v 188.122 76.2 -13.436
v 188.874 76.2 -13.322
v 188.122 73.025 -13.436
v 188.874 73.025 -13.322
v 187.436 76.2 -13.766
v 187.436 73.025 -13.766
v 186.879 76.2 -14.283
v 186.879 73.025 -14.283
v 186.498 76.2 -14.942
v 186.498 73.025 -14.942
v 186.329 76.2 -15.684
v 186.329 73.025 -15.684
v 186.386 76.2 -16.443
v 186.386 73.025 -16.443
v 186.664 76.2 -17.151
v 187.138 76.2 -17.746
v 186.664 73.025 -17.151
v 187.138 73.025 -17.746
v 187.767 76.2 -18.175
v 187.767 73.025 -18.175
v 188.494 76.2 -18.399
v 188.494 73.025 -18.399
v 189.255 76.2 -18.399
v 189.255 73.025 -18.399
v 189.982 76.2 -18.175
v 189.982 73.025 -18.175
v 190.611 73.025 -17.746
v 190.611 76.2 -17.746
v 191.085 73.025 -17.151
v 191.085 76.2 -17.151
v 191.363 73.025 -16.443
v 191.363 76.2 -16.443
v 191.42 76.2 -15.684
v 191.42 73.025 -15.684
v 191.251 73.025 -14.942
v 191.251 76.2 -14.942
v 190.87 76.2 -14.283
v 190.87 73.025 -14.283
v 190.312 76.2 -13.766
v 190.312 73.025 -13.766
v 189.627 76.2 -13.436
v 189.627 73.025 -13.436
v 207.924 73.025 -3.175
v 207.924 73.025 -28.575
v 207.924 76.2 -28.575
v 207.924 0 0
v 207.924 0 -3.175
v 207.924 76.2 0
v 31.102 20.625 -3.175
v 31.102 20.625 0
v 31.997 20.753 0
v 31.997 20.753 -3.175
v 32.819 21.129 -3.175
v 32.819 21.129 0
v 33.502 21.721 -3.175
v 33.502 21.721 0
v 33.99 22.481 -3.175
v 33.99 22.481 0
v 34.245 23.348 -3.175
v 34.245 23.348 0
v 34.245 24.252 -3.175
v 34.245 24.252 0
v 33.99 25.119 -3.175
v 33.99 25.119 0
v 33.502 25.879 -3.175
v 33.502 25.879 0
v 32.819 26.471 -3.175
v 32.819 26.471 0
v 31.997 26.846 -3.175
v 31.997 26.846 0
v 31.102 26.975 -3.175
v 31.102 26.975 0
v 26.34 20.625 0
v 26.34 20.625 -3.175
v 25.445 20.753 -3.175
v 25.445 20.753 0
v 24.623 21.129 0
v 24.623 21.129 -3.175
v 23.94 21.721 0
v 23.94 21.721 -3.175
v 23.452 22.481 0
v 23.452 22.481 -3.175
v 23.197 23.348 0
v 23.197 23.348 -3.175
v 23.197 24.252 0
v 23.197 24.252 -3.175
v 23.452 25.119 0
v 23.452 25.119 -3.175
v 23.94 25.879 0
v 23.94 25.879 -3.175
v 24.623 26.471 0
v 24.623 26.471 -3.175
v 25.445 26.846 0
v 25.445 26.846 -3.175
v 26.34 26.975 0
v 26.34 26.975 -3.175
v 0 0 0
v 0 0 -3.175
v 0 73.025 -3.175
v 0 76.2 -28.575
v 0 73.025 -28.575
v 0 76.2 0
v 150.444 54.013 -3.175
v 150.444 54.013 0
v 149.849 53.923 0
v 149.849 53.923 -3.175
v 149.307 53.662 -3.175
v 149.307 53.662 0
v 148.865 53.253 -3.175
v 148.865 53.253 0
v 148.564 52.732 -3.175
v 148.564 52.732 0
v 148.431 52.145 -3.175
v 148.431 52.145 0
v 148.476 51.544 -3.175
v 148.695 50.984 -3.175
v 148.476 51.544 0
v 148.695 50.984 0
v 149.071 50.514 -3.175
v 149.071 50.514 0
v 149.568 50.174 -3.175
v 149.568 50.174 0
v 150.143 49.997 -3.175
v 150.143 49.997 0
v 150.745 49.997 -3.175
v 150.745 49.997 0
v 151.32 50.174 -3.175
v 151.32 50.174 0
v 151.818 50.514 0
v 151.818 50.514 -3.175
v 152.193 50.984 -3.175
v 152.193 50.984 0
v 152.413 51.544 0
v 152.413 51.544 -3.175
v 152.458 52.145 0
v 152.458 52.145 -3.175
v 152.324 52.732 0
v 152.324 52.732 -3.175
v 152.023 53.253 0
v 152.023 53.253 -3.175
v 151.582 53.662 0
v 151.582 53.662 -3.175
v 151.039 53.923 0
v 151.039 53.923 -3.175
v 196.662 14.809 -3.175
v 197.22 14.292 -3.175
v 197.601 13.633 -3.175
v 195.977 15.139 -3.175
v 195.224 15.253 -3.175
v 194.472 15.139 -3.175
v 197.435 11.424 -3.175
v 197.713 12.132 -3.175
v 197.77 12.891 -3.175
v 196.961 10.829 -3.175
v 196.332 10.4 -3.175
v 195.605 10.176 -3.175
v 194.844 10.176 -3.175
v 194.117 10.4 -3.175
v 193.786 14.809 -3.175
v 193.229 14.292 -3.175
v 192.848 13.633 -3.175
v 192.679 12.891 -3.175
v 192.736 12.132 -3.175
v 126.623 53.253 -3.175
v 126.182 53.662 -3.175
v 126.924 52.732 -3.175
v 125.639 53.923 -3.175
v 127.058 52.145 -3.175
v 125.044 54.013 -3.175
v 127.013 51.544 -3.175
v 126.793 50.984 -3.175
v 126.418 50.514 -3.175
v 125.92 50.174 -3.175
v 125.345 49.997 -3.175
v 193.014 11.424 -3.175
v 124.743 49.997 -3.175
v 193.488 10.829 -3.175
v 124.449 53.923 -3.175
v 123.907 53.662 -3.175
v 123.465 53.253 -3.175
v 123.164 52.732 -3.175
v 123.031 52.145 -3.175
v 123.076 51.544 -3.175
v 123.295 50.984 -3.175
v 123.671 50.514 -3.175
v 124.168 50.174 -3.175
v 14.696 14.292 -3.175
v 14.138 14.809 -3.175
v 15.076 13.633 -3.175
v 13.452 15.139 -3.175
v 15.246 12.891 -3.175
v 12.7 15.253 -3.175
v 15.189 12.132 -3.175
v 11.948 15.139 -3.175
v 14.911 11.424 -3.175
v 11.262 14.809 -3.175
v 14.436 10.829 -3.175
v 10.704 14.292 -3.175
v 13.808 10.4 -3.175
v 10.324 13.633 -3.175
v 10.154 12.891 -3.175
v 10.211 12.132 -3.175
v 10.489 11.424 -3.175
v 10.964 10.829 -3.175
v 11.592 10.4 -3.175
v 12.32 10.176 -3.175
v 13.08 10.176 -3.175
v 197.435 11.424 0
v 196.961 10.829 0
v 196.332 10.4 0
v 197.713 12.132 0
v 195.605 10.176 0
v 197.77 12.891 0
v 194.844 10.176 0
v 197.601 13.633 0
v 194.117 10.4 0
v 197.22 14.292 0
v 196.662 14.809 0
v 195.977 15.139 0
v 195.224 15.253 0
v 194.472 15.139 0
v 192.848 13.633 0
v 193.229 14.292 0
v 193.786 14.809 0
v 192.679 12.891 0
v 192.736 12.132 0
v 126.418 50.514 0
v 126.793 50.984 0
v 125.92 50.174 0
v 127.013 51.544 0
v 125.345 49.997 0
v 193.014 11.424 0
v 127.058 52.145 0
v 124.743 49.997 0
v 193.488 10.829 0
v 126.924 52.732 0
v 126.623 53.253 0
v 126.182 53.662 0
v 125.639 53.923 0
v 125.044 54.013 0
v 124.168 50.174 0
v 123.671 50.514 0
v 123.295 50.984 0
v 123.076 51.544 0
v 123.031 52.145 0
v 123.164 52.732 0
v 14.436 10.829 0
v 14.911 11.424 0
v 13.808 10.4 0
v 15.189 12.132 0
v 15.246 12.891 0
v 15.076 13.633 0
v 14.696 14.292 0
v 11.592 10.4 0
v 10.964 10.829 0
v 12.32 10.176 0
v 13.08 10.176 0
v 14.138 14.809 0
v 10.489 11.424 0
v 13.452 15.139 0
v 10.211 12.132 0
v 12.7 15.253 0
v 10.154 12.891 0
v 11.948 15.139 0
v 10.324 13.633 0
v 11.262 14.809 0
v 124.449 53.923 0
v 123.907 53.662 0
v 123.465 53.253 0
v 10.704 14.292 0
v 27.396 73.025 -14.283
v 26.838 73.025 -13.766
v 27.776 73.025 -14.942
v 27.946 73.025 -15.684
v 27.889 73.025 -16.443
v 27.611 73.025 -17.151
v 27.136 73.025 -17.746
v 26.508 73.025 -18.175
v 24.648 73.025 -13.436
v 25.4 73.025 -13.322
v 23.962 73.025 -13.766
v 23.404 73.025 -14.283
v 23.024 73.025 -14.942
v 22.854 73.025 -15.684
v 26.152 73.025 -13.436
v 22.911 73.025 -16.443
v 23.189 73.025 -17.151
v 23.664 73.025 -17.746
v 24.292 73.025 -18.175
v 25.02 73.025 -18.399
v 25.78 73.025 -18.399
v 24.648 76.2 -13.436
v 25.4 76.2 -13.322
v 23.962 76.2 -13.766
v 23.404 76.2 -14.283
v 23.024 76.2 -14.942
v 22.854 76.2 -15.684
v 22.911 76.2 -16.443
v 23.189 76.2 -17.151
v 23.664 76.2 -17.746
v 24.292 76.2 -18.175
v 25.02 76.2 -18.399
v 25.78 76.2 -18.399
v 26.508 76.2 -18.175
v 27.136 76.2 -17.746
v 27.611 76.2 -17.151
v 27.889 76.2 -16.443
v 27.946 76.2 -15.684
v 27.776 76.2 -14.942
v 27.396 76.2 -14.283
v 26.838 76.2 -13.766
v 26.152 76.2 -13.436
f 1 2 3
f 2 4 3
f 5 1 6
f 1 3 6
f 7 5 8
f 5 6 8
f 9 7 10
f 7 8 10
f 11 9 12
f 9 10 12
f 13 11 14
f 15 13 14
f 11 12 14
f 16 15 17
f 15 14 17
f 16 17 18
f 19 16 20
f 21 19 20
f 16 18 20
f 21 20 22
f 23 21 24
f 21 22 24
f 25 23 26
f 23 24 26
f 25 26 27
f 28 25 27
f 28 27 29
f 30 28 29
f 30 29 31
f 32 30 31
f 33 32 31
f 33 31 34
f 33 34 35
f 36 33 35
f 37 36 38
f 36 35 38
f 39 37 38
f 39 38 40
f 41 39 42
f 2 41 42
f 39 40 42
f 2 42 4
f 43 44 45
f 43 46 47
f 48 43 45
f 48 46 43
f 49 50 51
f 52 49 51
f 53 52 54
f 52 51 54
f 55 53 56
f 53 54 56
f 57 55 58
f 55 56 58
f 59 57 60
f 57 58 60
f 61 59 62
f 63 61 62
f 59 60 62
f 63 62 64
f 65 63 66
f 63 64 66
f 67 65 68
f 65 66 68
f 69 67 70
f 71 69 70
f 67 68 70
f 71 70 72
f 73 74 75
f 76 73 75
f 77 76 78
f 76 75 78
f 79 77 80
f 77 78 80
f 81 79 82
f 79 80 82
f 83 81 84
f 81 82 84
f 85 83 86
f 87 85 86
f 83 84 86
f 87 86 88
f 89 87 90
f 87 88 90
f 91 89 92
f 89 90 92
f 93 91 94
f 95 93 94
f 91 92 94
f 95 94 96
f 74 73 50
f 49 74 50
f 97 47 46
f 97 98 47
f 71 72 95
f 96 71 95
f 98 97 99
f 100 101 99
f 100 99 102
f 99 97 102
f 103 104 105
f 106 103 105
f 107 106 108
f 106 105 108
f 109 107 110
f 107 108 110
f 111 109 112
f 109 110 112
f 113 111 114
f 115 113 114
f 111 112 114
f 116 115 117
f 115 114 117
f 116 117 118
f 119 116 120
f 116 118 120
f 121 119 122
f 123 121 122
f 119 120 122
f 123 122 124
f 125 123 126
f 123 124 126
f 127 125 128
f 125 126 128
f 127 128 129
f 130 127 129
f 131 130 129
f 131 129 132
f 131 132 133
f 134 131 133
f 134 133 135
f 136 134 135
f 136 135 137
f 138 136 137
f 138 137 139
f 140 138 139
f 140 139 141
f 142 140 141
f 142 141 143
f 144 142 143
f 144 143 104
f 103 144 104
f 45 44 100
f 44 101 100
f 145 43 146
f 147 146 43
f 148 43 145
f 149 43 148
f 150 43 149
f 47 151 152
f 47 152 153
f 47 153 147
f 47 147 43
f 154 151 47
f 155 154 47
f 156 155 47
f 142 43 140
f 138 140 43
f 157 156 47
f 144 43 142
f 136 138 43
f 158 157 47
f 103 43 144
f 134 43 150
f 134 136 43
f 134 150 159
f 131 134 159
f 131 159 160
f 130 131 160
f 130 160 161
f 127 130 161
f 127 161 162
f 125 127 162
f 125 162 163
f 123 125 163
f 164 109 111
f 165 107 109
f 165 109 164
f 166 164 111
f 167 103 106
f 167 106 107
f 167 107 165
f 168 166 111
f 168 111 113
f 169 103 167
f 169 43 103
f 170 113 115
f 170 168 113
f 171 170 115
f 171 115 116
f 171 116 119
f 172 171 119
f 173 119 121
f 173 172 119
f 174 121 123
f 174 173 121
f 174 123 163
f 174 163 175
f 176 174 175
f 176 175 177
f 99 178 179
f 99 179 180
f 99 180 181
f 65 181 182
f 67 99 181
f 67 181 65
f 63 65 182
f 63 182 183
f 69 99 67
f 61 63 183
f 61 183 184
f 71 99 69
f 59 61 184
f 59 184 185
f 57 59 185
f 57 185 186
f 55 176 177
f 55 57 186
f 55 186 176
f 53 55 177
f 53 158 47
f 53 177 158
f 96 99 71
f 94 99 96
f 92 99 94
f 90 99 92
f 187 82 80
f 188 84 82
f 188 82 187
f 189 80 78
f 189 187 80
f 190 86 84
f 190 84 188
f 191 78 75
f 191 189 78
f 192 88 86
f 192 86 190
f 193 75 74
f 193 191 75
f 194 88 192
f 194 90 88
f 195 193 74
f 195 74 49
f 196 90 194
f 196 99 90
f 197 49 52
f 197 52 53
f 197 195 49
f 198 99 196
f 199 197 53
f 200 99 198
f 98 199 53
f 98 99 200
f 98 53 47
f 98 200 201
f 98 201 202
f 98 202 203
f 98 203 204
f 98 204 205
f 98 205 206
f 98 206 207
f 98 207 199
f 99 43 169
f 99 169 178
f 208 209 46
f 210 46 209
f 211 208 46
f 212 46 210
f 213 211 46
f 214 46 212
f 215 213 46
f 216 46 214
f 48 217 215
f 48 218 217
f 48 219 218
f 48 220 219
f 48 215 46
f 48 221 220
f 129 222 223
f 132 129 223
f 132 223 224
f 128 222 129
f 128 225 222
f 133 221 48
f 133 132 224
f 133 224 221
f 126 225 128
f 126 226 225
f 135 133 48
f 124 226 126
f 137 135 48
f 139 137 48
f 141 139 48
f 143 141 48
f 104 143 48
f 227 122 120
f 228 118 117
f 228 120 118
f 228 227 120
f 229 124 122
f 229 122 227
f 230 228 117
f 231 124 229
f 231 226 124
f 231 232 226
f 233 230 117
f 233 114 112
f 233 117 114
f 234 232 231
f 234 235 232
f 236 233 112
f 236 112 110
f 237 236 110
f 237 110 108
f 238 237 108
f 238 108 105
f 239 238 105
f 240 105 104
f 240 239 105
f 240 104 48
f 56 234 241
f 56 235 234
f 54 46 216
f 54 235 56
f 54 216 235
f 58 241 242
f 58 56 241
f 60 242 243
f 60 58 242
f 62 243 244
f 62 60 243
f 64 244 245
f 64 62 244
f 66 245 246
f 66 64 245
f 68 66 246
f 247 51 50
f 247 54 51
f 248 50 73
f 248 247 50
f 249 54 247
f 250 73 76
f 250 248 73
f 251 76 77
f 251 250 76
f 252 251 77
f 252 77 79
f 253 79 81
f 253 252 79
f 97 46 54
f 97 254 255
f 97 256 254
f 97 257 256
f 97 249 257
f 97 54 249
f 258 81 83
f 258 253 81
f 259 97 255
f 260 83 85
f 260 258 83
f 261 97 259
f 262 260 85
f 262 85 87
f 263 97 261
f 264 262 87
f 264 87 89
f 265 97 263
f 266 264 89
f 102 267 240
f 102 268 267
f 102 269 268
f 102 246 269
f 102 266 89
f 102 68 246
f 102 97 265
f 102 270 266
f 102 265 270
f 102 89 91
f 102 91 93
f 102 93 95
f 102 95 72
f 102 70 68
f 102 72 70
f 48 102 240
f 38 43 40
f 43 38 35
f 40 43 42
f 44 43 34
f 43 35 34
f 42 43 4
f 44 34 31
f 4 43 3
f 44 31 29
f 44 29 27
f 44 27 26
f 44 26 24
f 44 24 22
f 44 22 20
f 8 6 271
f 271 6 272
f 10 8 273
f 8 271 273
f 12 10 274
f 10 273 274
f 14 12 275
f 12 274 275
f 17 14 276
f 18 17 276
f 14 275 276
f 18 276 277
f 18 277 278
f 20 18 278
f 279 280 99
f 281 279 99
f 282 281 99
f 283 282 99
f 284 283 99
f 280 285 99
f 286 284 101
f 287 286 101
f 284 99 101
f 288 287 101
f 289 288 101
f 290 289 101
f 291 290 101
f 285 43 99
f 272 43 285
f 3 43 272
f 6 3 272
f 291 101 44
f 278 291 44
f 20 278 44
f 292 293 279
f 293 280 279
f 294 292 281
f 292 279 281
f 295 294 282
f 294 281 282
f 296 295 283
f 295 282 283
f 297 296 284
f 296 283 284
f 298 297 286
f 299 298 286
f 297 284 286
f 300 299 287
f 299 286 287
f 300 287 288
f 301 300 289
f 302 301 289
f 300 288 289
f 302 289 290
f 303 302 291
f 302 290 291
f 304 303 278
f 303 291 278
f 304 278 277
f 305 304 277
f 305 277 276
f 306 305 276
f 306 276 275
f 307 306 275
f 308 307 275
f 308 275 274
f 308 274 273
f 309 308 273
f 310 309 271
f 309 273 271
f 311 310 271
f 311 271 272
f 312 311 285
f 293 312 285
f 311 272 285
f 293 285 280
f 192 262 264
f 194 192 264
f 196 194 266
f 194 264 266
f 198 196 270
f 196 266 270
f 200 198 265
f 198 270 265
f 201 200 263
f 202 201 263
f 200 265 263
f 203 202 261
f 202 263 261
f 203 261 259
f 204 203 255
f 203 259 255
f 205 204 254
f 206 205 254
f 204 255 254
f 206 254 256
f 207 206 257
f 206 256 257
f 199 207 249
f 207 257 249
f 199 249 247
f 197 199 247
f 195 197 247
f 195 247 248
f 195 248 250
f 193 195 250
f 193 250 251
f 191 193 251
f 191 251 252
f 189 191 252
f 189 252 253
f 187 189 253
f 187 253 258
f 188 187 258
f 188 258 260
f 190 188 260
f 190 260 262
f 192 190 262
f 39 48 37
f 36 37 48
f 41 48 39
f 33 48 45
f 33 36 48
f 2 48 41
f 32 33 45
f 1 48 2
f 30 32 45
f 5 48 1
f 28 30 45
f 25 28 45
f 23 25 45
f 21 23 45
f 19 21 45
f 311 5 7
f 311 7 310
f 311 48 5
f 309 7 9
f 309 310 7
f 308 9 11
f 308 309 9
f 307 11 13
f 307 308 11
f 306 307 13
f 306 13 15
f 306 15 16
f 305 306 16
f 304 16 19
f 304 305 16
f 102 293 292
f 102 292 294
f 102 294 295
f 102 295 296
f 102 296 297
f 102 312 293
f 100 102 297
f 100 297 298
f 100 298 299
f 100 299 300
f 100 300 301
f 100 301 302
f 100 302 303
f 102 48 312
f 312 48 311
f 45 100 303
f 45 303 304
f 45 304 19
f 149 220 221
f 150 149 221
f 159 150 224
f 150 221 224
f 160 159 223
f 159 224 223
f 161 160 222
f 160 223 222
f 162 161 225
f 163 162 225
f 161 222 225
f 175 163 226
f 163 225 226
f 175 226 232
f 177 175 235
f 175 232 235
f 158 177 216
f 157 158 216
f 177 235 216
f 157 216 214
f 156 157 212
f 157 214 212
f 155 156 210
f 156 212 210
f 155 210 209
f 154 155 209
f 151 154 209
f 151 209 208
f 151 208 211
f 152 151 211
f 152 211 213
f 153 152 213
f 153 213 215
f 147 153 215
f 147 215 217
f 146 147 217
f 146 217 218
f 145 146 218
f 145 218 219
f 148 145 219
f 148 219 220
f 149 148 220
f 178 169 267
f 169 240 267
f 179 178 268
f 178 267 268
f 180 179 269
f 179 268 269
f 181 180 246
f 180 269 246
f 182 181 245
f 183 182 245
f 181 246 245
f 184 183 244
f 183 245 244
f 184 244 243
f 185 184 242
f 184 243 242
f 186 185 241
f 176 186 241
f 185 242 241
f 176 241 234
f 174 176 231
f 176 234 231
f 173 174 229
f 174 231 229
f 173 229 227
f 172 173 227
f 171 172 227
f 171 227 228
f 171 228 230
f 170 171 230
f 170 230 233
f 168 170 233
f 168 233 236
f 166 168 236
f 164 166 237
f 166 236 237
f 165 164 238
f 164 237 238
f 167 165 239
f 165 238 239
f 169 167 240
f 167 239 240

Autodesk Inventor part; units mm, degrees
ref_plane "YZ Plane" through (0, 0, 0) normal (1, 0, 0) x (0, 1, 0)
ref_plane "XZ Plane" through (0, 0, 0) normal (0, 1, 0) x (-1, 0, 0)
ref_plane "XY Plane" through (0, 0, 0) normal (0, 0, 1) x (1, 0, 0)
sketch "Sketch1" plane through (0, 0, 0) normal (1, 0, 0) x (0, 1, 0)
  line L0 (0, 0) -> (76.2, 0)
  line L1 (76.2, 0) -> (76.2, -3.175)
  line L2 (76.2, -3.175) -> (0, -3.175)
  line L3 (0, -3.175) -> (0, 0)
  line L4 (76.2, 0) -> (73.025, 0)
  line L5 (73.025, 0) -> (73.025, -28.575)
  line L6 (73.025, -28.575) -> (76.2, -28.575)
  line L7 (76.2, -28.575) -> (76.2, 0)
  dimension "d0" = 76.2
  dimension "d1" = 3.175
  dimension "d2" = 28.575
extrude "Extrusion1" add sketch "Sketch1" along normal blind 207.9244
sketch "Sketch2" plane through (0, 0, -3.175) normal (0, 0, -1) x (-1, 0, 0)
  line L0 (-207.9244, 0) -> (-207.9244, 73.025) projected
  line L1 (0, 76.2) -> (-207.9244, 76.2) projected
  point P0 (0, 0)
  point P1 (-150.4442, 51.9938)
  point P2 (-125.0442, 51.9938)
  dimension "d5" = 57.4802
  dimension "d6" = 82.8802
  dimension "d7" = 24.2062
  dimension "d8" = 24.2062
hole "Hole1" at (150.4442, 51.9938, -3.175) at (125.0442, 51.9938, -3.175) direction (0, 0, 1) diameter 4.0386 end through all
sketch "Sketch5" plane through (0, 76.2, 0) normal (0, 1, 0) x (1, 0, 0)
  line L0 (0, 28.575) -> (207.9244, 28.575) projected
  line L1 (207.9244, 28.575) -> (207.9244, 0) projected
  line L2 (0, 28.575) -> (0, 0) projected
  point P0 (188.8744, 15.875)
  point P1 (25.4, 15.875)
  dimension "d43" = 12.7
  dimension "d44" = 12.7
  dimension "d45" = 19.05
  dimension "d46" = 25.4
sketch "Sketch6" plane through (0, 0, -3.175) normal (0, 0, -1) x (-1, 0, 0)
  line L0 (0, 0) -> (-207.9244, 0) projected
  line L1 (-207.9244, 0) -> (-207.9244, 73.025) projected
  line L2 (0, 0) -> (0, 73.025) projected
  point P0 (-195.2244, 12.7)
  point P1 (-12.7, 12.7)
  dimension "d47" = 12.7
  dimension "d48" = 12.7
  dimension "d49" = 12.7
  dimension "d50" = 12.7
hole "Hole4" at (195.2244, 12.7, -3.175) at (12.7, 12.7, -3.175) direction (0, 0, 1) diameter 5.1054 end through all clearance for "Flat Head Machine Screw (82)" size "#10" standard "Ansi Unified Screw Threads"
hole "Hole3" at (25.4, 76.2, -15.875) at (188.8744, 76.2, -15.875) direction (0, -1, 0) diameter 5.1054 end through all clearance for "Flat Head Machine Screw (82)" size "#10" standard "Ansi Unified Screw Threads"
sketch "Sketch7" plane through (0, 0, 0) normal (0, 0, 1) x (1, 0, 0)
  line L0 (0, 0) -> (207.9244, 0) projected
  line L1 (207.9244, 76.2) -> (207.9244, 0) projected
  line L2 (0, 76.2) -> (0, 0) projected
  point P0 (26.3398, 23.7998)
  dimension "d67" = 23.7998
  dimension "d76" = 26.3398
hole "Hole5" at (26.3398, 23.7998, 0) direction (0, 0, -1) diameter 6.35 end through all
sketch "Sketch8" plane through (0, 0, 0) normal (0, 0, 1) x (1, 0, 0)
  circle A0 centre (26.3398, 23.7998) radius 3.175 projected
  line L0 (26.3398, 23.7998) -> (31.1023, 23.7998) construction
  line L1 (26.3398, 20.6248) -> (31.1023, 20.6248)
  line L2 (31.1023, 26.9748) -> (26.3398, 26.9748)
  arc A1 (26.3398, 26.9748) -> (26.3398, 20.6248) centre (26.3398, 23.7998) ccw
  arc A2 (31.1023, 20.6248) -> (31.1023, 26.9748) centre (31.1023, 23.7998) ccw
  point P0 (0, 0)
  point P1 (28.721, 23.7998)
  dimension "d77" = 4.7625
extrude "Extrusion3" cut sketch "Sketch8" against normal blind 25.4 contours A0 L2 A2 L1
sketch "Sketch3" plane through (0, 0, -3.175) normal (0, 0, -1) x (-1, 0, 0)
  line L0 (-158.5408, 14.5542) -> (38.7343, 14.5542) construction
  line L1 (0, 76.2) -> (-207.9244, 76.2) construction
  line L2 (-161.6607, 44.1198) -> (30.0945, 44.1198) construction
  line L3 (-31.75, 37.7698) -> (-12.7, 37.7698) construction
  line L4 (-31.75, 35.2806) -> (-12.7, 35.2806)
  line L5 (-12.7, 40.259) -> (-31.75, 40.259)
  arc A0 (-31.75, 40.259) -> (-31.75, 35.2806) centre (-31.75, 37.7698) ccw
  arc A1 (-12.7, 35.2806) -> (-12.7, 40.259) centre (-12.7, 37.7698) ccw
  line L6 (-31.75, 25.4) -> (-12.7, 25.4) construction
  line L7 (-31.75, 22.9108) -> (-12.7, 22.9108)
  line L8 (-12.7, 27.8892) -> (-31.75, 27.8892)
  arc A2 (-31.75, 27.8892) -> (-31.75, 22.9108) centre (-31.75, 25.4) ccw
  arc A3 (-12.7, 22.9108) -> (-12.7, 27.8892) centre (-12.7, 25.4) ccw
  line L9 (0, 0) -> (0, 73.025) projected
  line L10 (-69.85, 37.7698) -> (-50.8, 37.7698) construction
  line L11 (-69.85, 35.2806) -> (-50.8, 35.2806)
  line L12 (-50.8, 40.259) -> (-69.85, 40.259)
  arc A4 (-69.85, 40.259) -> (-69.85, 35.2806) centre (-69.85, 37.7698) ccw
  arc A5 (-50.8, 35.2806) -> (-50.8, 40.259) centre (-50.8, 37.7698) ccw
  point P0 (-22.225, 37.7698)
  point P1 (-22.225, 25.4)
  point P2 (-60.325, 37.7698)
  dimension "d16" = 61.6458
  dimension "d17" = 29.5656
  dimension "d19" = 2.4892
  dimension "d20" = 6.35
  dimension "d29" = 38.1
  dimension "d30" = 6.35
  dimension "d31" = 19.05
  dimension "d32" = 31.75
  dimension "d33" = 31.75
  dimension "d65" = 10.8458
sketch "Sketch4" plane through (0, 0, -3.175) normal (0, 0, -1) x (-1, 0, 0)
  line L0 (-12.7, 35.2806) -> (-31.75, 35.2806) projected
  arc A0 (-12.7, 22.9108) -> (-12.7, 27.8892) centre (-12.7, 25.4) ccw projected
  line L1 (-12.7, 22.9108) -> (-31.75, 22.9108) projected
  arc A1 (-31.75, 27.8892) -> (-31.75, 22.9108) centre (-31.75, 25.4) ccw projected
  line L2 (-31.75, 27.8892) -> (-12.7, 27.8892) projected
  arc A2 (-12.7, 35.2806) -> (-12.7, 40.259) centre (-12.7, 37.7698) ccw projected
  line L3 (-12.7, 35.2806) -> (-31.75, 35.2806) projected
  arc A3 (-31.75, 40.259) -> (-31.75, 35.2806) centre (-31.75, 37.7698) ccw projected
  line L4 (-31.75, 40.259) -> (-12.7, 40.259) projected
  arc A4 (-50.8, 35.2806) -> (-50.8, 40.259) centre (-50.8, 37.7698) ccw projected
  line L5 (-50.8, 35.2806) -> (-69.85, 35.2806) projected
  arc A5 (-69.85, 40.259) -> (-69.85, 35.2806) centre (-69.85, 37.7698) ccw projected
  line L6 (-69.85, 40.259) -> (-50.8, 40.259) projected
  circle A6 centre (-125.0442, 51.9938) radius 2.0193 projected
  circle A7 centre (-99.6442, 51.9938) radius 2.0193 projected
  line L7 (-182.5244, 73.025) -> (0, 73.025) projected
  line L8 (-182.5244, 0) -> (-182.5244, 73.025) projected
  line L9 (0, 0) -> (-182.5244, 0) projected
  line L10 (0, 0) -> (0, 73.025) projected
  point P0 (0, 0)
  point P1 (-9.652, 31.5849)
  dimension "d34" = 3.6957
  dimension "d35" = 22.098
  dimension "d66" = 7.3914
equation "\"d8\" = d7"
equation "\"d30\" = d20"
equation "\"d33\" = d32"
equation "\"d34\" = 0.5 * d66"
properties part number "CAR_019_TensionerLBracket" material "Aluminum 6061"
